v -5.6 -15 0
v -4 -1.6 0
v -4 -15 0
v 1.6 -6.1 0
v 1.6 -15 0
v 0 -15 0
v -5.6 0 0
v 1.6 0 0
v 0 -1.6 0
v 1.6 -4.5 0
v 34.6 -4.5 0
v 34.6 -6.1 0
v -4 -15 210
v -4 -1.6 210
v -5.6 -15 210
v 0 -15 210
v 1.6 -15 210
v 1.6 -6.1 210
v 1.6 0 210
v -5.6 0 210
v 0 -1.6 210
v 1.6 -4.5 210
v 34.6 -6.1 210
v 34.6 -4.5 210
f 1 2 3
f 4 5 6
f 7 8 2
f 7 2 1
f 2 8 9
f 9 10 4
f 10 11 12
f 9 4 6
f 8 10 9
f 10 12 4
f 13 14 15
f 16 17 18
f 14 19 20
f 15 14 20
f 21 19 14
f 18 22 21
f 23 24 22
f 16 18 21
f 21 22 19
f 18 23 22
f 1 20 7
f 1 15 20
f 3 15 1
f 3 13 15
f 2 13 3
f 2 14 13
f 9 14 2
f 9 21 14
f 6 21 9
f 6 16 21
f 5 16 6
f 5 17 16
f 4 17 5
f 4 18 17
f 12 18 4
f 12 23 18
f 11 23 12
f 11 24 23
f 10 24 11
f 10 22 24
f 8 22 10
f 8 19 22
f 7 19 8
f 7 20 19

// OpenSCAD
// file: ../lib/project/gap_guard.scad
// lib/project/gap_guard.scad
// Gap guard profile and 3D module for rimless aquarium rear gap.
// Origin (0,0): top edge of tank glass at inner back corner; +X into tank, -Y down.
// Profile is X-Y; extrusion is along +Z.

// ---------- 2D helpers (clip channel and tongue bar; used by profile and debug) ----------
module clip_channel_2d(channel_width, wall_t, clip_h) {
  union() {
    translate([-(channel_width + wall_t), -clip_h]) square([wall_t, clip_h]);
    translate([0, -clip_h]) square([wall_t, clip_h]);
    translate([-(channel_width + wall_t), -wall_t])
      square([channel_width + 2 * wall_t, wall_t]);
  }
}

module tongue_bar_2d(wall_t, tongue_top, tongue_depth_val) {
  translate([wall_t, tongue_top - wall_t]) square([tongue_depth_val, wall_t]);
}

// ---------- Derived values (single source of truth) ----------
// Returns [channel_width, tongue_depth_val, lid_bottom_below_rim, tongue_top, tongue_bottom].
// channel_width: clip channel inner width (glass_t + clip_clearance).
// tongue_depth_val: depth of tongue bar into gap (gap_depth - tongue_margin).
// lid_bottom_below_rim: lid bottom Y position below rim (lid_top_below_rim + lid_t).
// tongue_top: Y coordinate of top of tongue bar, below rim (negative).
// tongue_bottom: Y coordinate of bottom of tongue bar (tongue_top - wall_t).
function gap_guard_derived(glass_t, clip_clearance, gap_depth, tongue_margin, lid_top_below_rim, lid_t, lid_clearance, wall_t) = let(
  channel_width = glass_t + clip_clearance,
  tongue_depth_val = gap_depth - tongue_margin,
  lid_bottom_below_rim = lid_top_below_rim + lid_t,
  tongue_top = -(lid_bottom_below_rim + lid_clearance),
  tongue_bottom = tongue_top - wall_t
) [channel_width, tongue_depth_val, lid_bottom_below_rim, tongue_top, tongue_bottom];

// ---------- Module: 2D profile (no guard_len) ----------
// chamfer: corner relief size (mm); 0 = sharp edges; >0 bevels outer profile edges via offset.
module gap_guard_profile_2d(
  gap_depth,
  tongue_margin,
  wall_t,
  glass_t,
  clip_clearance,
  clip_h,
  lid_t,
  lid_top_below_rim,
  lid_clearance,
  chamfer = 0
) {
  d = gap_guard_derived(glass_t, clip_clearance, gap_depth, tongue_margin, lid_top_below_rim, lid_t, lid_clearance, wall_t);
  channel_width = d[0];
  tongue_depth_val = d[1];
  tongue_top = d[3];

  module profile_core() {
    union() {
      clip_channel_2d(channel_width, wall_t, clip_h);
      tongue_bar_2d(wall_t, tongue_top, tongue_depth_val);
    }
  }

  if (chamfer > 0) {
    // Bevel outer edges: shrink then expand with 45° chamfer
    offset(delta = -chamfer)
      offset(delta = chamfer, chamfer = true)
        profile_core();
  } else {
    profile_core();
  }
}

// ---------- Module: 3D guard (linear_extrude along Z) ----------
// chamfer: passed to profile; bevels outer 2D edges when > 0.
module gap_guard(
  guard_len,
  gap_depth,
  tongue_margin,
  wall_t,
  glass_t,
  clip_clearance,
  clip_h,
  lid_t,
  lid_top_below_rim,
  lid_clearance,
  chamfer = 0,
  debug = false
) {
  d = gap_guard_derived(glass_t, clip_clearance, gap_depth, tongue_margin, lid_top_below_rim, lid_t, lid_clearance, wall_t);
  channel_width = d[0];
  tongue_depth_val = d[1];
  lid_bottom_below_rim = d[2];
  tongue_top = d[3];
  tongue_bottom = d[4];

  linear_extrude(height = guard_len)
    gap_guard_profile_2d(
      gap_depth = gap_depth,
      tongue_margin = tongue_margin,
      wall_t = wall_t,
      glass_t = glass_t,
      clip_clearance = clip_clearance,
      clip_h = clip_h,
      lid_t = lid_t,
      lid_top_below_rim = lid_top_below_rim,
      lid_clearance = lid_clearance,
      chamfer = chamfer
    );

  if (debug) {
    x_min = -(channel_width + wall_t);
    x_span = (wall_t + tongue_depth_val) - x_min;
    // Reference plane: y = 0 (rim top)
    translate([x_min, -0.1, 0]) cube([x_span, 0.2, guard_len]);
    // Reference plane: y = -lid_bottom_below_rim (lid bottom nominal)
    translate([x_min, -lid_bottom_below_rim - 0.1, 0]) cube([x_span, 0.2, guard_len]);
    // Reference plane: x = wall_t + tongue_depth_val (nominal coverage)
    y_plane_min = tongue_bottom;
    y_plane_span = 0 - y_plane_min;
    translate([wall_t + tongue_depth_val - 0.1, y_plane_min, 0])
      cube([0.2, y_plane_span, guard_len]);

    // Highlight clip channel and tongue (reuse 2D helpers)
    # linear_extrude(height = guard_len) {
      clip_channel_2d(channel_width, wall_t, clip_h);
      tongue_bar_2d(wall_t, tongue_top, tongue_depth_val);
    }
  }
}
// main file
// models/gap_guard.scad
// Thin wrapper for the rimless aquarium rear gap guard.
// Reusable profile and 3D module live in lib/project/gap_guard.scad.

use <../lib/project/gap_guard.scad>;

// ---------- Public parameters (mm, per spec) ----------
guard_len = 210.0;
gap_depth = 35.0;
tongue_margin = 2.0;
wall_t = 1.6;
glass_t = 4.0;
clip_clearance = 0.0;
clip_h = 15.0;
lid_t = 3.0;
lid_top_below_rim = 1.0;
lid_clearance = 0.5;
chamfer = 0;   // no chamfer; profile uses square()/rectangular extrusion so $fn has no effect
// $fn = 64;
debug = false;

// ---------- Model ----------
gap_guard(
  guard_len = guard_len,
  gap_depth = gap_depth,
  tongue_margin = tongue_margin,
  wall_t = wall_t,
  glass_t = glass_t,
  clip_clearance = clip_clearance,
  clip_h = clip_h,
  lid_t = lid_t,
  lid_top_below_rim = lid_top_below_rim,
  lid_clearance = lid_clearance,
  chamfer = chamfer,
  debug = debug
);
